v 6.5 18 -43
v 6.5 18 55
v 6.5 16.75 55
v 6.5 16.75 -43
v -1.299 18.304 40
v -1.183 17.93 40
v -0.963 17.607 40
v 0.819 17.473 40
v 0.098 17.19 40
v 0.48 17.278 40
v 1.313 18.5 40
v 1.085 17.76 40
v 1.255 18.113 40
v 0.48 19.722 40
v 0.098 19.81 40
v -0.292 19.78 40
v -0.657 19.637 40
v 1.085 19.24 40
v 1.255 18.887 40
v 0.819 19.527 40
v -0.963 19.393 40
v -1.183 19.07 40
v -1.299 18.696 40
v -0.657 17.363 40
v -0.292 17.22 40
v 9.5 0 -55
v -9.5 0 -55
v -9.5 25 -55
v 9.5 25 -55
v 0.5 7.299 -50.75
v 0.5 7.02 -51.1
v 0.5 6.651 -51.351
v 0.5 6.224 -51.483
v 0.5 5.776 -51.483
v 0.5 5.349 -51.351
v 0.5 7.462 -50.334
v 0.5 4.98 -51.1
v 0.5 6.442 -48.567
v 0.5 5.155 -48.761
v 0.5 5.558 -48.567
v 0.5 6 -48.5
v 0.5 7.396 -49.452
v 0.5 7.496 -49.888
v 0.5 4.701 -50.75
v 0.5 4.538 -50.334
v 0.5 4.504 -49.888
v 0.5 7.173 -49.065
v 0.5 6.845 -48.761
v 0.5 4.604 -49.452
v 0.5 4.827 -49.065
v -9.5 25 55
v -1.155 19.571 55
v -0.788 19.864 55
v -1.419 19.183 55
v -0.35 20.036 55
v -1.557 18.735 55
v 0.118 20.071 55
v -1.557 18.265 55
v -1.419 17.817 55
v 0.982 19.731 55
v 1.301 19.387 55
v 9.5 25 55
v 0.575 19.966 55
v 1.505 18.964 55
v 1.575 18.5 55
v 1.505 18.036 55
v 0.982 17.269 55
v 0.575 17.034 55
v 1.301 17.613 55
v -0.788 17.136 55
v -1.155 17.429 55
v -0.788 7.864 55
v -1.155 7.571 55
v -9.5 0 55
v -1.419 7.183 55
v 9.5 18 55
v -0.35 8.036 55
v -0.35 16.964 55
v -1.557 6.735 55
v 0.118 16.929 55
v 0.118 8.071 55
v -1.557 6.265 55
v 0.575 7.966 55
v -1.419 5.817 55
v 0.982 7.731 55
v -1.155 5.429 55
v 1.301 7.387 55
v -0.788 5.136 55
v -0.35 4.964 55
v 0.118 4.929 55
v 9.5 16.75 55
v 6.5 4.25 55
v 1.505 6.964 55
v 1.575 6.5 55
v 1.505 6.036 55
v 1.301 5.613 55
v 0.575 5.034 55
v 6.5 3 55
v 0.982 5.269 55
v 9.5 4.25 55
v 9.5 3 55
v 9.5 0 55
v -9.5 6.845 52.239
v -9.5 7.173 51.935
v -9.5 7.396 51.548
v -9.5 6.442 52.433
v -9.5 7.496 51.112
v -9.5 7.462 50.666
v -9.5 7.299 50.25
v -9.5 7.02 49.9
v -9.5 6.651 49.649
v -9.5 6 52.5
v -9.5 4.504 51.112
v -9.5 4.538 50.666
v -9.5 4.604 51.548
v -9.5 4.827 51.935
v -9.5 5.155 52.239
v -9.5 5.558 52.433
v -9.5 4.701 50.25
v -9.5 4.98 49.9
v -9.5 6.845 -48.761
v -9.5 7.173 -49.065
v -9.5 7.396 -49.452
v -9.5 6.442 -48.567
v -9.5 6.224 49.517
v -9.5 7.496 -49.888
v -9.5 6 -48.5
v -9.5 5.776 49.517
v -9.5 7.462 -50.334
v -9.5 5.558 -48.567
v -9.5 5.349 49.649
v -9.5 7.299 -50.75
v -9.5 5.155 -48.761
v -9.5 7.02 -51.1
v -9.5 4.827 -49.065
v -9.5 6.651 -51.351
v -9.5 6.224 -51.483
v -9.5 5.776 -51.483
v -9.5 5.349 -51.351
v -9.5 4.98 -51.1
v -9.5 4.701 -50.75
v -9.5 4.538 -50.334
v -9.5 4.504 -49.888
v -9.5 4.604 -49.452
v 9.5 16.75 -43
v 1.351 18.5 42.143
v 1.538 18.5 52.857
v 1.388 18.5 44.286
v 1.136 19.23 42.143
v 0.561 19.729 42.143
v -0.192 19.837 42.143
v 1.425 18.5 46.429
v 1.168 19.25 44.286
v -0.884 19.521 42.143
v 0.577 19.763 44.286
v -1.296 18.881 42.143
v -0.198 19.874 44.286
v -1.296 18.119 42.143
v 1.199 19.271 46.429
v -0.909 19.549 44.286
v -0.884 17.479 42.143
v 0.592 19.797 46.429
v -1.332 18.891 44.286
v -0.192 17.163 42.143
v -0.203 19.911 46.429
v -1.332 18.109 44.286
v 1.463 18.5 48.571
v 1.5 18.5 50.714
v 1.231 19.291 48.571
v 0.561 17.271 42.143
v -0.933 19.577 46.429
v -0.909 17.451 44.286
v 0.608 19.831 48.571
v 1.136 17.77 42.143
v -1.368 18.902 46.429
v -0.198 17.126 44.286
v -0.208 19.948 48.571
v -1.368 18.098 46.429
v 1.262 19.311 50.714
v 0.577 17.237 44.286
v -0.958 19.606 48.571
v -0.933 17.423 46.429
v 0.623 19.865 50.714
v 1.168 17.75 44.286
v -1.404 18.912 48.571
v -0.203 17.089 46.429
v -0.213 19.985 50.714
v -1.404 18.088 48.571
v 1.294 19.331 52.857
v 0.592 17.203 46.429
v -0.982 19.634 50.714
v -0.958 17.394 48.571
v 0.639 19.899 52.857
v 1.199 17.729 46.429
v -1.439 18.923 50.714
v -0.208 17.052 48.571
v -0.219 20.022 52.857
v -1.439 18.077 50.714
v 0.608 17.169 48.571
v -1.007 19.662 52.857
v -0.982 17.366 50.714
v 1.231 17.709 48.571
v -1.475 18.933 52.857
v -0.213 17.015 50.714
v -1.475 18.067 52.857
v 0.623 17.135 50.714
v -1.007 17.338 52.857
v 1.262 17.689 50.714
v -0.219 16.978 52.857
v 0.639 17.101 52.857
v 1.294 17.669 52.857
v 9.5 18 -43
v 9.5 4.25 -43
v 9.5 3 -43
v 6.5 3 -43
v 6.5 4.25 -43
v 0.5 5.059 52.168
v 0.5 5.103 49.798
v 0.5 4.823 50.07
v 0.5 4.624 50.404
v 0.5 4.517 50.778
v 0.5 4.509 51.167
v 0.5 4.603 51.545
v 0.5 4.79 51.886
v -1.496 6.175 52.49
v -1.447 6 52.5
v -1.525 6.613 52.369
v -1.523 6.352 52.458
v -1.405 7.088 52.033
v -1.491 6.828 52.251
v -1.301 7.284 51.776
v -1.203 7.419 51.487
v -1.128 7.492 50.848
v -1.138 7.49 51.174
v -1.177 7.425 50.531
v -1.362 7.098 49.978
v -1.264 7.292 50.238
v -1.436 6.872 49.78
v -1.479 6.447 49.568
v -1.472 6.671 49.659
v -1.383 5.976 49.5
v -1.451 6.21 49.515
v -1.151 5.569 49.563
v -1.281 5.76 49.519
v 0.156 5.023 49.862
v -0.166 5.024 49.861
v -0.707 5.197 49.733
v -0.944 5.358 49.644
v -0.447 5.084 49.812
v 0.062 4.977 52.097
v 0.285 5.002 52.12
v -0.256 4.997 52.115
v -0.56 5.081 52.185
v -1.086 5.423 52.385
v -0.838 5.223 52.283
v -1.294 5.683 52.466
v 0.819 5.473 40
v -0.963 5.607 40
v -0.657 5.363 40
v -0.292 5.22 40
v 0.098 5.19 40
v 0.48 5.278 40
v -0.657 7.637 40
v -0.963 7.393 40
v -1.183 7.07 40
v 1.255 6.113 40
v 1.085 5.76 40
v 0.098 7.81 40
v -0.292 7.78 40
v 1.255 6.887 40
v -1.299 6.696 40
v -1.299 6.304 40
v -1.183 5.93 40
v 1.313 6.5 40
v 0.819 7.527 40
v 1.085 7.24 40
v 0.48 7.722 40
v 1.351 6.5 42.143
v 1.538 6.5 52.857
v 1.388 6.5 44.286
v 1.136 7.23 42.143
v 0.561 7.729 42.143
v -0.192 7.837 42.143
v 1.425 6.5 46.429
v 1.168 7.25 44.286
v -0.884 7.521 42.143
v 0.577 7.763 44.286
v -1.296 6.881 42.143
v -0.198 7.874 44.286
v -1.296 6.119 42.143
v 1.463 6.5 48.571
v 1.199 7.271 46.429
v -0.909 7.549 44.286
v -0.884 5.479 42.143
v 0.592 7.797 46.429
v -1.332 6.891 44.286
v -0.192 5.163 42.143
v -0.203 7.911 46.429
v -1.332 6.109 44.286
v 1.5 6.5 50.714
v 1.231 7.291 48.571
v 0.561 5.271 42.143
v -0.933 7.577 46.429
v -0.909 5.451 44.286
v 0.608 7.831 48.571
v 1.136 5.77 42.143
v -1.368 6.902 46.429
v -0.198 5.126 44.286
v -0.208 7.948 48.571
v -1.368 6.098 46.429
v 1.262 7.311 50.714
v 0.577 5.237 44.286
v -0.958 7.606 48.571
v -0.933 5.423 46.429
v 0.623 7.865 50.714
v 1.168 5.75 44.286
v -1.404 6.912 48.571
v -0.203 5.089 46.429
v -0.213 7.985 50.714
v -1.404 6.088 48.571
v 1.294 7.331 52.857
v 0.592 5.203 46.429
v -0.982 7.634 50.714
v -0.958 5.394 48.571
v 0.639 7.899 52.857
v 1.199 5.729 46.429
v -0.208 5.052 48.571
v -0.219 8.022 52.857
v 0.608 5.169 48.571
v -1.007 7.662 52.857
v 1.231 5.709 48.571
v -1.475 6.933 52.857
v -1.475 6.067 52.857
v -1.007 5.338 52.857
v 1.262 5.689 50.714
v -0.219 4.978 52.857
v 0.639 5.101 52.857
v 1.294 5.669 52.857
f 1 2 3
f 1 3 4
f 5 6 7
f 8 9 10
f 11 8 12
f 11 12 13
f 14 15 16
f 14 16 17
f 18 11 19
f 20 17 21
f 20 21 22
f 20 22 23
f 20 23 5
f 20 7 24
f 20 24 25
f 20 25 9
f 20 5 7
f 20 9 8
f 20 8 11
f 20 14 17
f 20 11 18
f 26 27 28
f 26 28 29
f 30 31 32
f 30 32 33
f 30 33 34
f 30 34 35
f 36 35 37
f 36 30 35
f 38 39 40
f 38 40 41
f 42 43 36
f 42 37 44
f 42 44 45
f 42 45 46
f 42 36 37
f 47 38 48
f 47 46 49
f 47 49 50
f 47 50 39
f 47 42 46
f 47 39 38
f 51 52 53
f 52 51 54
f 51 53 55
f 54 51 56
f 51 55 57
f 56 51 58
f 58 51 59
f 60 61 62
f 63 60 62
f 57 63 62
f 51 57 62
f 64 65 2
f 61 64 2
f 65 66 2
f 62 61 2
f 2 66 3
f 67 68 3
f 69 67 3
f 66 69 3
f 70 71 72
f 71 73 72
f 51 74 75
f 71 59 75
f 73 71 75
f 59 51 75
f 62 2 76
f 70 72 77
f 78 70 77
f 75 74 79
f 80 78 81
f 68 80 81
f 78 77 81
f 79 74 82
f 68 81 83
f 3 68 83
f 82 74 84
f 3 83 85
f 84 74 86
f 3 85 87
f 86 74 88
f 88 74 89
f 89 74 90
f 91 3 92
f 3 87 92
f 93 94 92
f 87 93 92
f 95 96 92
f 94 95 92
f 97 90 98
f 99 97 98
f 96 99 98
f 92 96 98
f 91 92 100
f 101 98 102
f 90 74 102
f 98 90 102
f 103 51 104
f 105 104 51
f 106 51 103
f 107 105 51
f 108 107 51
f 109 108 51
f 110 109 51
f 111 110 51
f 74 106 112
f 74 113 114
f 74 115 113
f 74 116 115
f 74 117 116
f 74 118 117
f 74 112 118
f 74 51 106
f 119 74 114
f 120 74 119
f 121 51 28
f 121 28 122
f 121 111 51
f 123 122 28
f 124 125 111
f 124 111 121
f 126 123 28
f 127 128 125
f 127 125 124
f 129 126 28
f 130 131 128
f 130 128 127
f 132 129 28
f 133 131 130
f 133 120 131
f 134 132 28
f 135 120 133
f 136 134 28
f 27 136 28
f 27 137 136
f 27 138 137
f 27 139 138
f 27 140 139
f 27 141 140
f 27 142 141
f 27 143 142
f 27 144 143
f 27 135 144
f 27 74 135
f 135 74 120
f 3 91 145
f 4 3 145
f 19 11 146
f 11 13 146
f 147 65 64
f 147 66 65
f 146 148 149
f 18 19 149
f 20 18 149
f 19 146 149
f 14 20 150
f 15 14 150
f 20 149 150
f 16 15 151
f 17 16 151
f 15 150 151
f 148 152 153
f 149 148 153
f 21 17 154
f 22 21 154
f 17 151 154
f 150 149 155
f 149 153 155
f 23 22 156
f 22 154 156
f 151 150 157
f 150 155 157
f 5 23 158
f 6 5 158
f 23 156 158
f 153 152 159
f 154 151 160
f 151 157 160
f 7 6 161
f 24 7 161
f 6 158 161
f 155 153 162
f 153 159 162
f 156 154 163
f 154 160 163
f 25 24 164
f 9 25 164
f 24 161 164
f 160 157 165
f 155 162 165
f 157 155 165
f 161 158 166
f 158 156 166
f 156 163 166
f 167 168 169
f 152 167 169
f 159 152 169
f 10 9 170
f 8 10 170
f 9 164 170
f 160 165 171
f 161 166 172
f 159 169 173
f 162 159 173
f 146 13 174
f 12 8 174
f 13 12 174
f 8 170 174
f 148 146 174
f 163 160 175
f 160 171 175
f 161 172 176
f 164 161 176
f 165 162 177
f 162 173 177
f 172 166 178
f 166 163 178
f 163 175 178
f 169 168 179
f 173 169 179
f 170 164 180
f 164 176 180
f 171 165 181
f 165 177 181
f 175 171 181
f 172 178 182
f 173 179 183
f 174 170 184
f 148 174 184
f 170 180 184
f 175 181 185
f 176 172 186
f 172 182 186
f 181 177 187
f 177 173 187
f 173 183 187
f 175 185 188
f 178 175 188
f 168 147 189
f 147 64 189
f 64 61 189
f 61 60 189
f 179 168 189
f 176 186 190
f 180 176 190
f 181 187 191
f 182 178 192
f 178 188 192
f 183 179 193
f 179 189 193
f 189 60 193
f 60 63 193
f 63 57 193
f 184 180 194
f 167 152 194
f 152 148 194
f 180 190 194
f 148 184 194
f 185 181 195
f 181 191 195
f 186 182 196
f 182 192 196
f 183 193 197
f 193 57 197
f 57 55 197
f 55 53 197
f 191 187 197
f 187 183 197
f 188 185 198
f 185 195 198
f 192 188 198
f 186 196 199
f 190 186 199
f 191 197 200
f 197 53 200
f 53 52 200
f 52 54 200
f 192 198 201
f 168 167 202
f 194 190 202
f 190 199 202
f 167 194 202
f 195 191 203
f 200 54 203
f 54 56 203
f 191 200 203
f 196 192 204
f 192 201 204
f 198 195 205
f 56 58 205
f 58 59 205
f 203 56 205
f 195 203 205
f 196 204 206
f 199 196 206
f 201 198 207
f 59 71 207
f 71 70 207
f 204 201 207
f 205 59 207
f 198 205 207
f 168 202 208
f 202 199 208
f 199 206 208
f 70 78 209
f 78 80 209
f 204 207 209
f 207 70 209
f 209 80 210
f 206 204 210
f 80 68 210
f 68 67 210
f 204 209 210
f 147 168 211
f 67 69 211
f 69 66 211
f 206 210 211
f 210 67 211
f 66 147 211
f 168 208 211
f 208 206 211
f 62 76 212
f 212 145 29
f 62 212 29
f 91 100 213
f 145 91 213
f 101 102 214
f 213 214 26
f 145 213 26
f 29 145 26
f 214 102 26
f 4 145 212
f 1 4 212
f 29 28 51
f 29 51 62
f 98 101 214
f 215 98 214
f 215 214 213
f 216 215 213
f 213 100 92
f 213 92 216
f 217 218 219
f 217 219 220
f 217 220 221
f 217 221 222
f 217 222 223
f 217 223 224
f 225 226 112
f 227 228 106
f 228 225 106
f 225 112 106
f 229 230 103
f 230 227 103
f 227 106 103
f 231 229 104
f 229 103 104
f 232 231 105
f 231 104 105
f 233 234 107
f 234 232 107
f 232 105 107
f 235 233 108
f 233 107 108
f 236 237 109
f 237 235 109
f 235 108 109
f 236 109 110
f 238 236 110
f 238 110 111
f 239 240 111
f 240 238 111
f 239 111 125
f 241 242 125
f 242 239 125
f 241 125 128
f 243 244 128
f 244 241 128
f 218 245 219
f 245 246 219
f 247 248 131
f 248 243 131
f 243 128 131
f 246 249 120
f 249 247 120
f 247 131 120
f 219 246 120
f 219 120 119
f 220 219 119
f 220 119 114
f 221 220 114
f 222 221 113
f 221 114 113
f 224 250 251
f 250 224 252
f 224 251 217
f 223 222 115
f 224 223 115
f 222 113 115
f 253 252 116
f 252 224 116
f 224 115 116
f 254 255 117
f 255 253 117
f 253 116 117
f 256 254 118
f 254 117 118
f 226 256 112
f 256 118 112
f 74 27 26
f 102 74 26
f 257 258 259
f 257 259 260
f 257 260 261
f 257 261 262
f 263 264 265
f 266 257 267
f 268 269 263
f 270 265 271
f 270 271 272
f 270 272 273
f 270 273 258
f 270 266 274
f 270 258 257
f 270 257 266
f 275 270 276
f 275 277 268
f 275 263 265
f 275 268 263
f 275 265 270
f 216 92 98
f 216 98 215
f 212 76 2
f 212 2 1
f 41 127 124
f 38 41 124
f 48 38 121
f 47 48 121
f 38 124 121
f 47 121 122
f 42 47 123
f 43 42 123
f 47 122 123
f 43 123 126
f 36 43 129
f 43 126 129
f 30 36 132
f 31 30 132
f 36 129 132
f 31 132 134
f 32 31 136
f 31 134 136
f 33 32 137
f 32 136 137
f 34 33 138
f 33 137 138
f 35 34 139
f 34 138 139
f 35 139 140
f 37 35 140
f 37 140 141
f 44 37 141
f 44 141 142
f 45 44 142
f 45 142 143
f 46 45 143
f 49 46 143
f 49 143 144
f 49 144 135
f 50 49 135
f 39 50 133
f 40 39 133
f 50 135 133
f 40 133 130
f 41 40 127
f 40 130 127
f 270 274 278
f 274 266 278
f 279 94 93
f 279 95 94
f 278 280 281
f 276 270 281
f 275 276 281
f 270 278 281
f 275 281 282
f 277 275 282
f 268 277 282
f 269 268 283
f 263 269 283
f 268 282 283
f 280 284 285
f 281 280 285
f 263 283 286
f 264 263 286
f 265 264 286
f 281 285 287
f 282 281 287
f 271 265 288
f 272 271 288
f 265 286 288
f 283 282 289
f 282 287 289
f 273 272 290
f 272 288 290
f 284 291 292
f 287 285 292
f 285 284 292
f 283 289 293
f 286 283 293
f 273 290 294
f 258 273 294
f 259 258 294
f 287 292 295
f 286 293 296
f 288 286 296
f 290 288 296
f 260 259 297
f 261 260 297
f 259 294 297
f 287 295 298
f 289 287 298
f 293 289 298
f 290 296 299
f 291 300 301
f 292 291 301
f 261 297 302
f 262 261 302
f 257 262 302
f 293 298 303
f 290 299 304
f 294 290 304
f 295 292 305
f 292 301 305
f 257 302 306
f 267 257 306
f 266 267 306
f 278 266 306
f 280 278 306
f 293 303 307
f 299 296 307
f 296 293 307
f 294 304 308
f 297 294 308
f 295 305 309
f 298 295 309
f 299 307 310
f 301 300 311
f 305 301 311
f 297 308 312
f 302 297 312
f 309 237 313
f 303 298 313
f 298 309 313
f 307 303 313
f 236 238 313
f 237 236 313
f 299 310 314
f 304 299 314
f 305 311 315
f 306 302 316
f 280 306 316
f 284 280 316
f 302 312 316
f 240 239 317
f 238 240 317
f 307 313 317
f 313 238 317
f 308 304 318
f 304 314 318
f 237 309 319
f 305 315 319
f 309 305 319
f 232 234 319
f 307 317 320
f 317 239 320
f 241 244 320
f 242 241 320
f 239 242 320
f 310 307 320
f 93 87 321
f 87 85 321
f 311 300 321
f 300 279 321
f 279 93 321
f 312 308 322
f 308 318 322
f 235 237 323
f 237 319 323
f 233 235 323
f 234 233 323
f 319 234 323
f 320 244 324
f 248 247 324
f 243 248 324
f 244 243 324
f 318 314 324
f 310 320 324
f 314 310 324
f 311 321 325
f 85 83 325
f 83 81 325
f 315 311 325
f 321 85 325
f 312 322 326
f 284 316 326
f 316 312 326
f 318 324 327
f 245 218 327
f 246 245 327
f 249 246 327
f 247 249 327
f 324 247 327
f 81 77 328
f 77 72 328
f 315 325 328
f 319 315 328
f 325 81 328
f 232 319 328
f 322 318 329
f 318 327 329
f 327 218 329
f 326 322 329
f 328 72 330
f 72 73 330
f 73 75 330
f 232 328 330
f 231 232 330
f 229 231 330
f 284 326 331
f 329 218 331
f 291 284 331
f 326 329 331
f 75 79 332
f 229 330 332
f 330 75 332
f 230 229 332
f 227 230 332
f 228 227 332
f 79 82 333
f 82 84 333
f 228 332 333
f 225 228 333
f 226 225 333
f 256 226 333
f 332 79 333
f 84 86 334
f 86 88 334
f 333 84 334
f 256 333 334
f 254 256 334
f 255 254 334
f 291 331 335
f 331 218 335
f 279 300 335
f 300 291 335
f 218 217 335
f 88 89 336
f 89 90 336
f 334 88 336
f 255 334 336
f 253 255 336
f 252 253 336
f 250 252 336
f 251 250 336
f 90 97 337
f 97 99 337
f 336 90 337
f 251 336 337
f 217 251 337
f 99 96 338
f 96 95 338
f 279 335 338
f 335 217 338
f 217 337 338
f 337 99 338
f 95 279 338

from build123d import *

# Parameters (mm, degrees)
SKETCH1_W                    = 19
SKETCH1_H                    = 110
BLOCK_DEPTH                  = 25
SKETCH2_W                    = 98
SKETCH2_H                    = 1.25
SLIDES_DEPTH                 = 3
SKETCH3_R                    = 1.5
MOUNTING_HOLES_DEPTH         = 10
SKETCH5_R                    = 1.575
CUT_EXTRUDE1_DEPTH           = 15
CUT_EXTRUDE1_DRAFT           = -1
CUT_EXTRUDE1_PROFILE_2_DEPTH = 15
CUT_EXTRUDE1_PROFILE_2_DRAFT = -1


with BuildPart() as part:
    # Sketch1 → Block (new body)
    with BuildSketch(Plane(origin=(0, 0, 0), x_dir=(1, 0, 0), z_dir=(0, 1, 0))):
        Rectangle(SKETCH1_W, SKETCH1_H)
    extrude(amount=BLOCK_DEPTH)

    # Sketch2 → Slides (cut)
    with BuildSketch(Plane(origin=(9.5, 0, 0), x_dir=(0, 0, -1), z_dir=(1, 0, 0))):
        with Locations((-6, 3.625)):
            Rectangle(SKETCH2_W, SKETCH2_H)
        with Locations((-6, 17.375)):
            Rectangle(SKETCH2_W, SKETCH2_H)
    extrude(amount=-SLIDES_DEPTH, mode=Mode.SUBTRACT)

    # Sketch3 → Mounting Holes (cut)
    with BuildSketch(Plane.ZY.offset(9.5)):
        with Locations((-50, 6)):
            Circle(SKETCH3_R)
        with Locations((51, 6)):
            Circle(SKETCH3_R)
    extrude(amount=-MOUNTING_HOLES_DEPTH, mode=Mode.SUBTRACT)


with BuildPart() as cut_extrude1_tool:
    # Sketch5 → Cut-Extrude1 (with draft: the straight prism first)
    with BuildSketch(Plane.XY.offset(55)):
        with Locations((0, 18.5)):
            Circle(SKETCH5_R)
    extrude(amount=-CUT_EXTRUDE1_DEPTH)
    # Cut-Extrude1: the draft: its side faces are tilted about the plane it starts from
    cut_extrude1_sides = [cut_extrude1_tool.faces().sort_by_distance(p)[0] for p in [
        (-1.575, 18.5, 47.5),
    ]]
    draft(cut_extrude1_sides, Plane.XY.offset(55), CUT_EXTRUDE1_DRAFT)


with BuildPart() as part_1:
    add(part.part)

    # Cut-Extrude1: cut by cut_extrude1_tool
    add(cut_extrude1_tool.part, mode=Mode.SUBTRACT)


with BuildPart() as cut_extrude1_profile_2_tool:
    # Sketch5 → Cut-Extrude1 profile 2 (with draft: the straight prism first)
    with BuildSketch(Plane.XY.offset(55)):
        with Locations((0, 6.5)):
            Circle(SKETCH5_R)
    extrude(amount=-CUT_EXTRUDE1_PROFILE_2_DEPTH)
    # Cut-Extrude1 profile 2: the draft: its side faces are tilted about the plane it starts from
    cut_extrude1_profile_2_sides = [cut_extrude1_profile_2_tool.faces().sort_by_distance(p)[0] for p in [
        (-1.575, 6.5, 47.5),
    ]]
    draft(cut_extrude1_profile_2_sides, Plane.XY.offset(55), CUT_EXTRUDE1_PROFILE_2_DRAFT)


with BuildPart() as part_2:
    add(part_1.part)

    # Cut-Extrude1 profile 2: cut by cut_extrude1_profile_2_tool
    add(cut_extrude1_profile_2_tool.part, mode=Mode.SUBTRACT)


solid = part_2.part
